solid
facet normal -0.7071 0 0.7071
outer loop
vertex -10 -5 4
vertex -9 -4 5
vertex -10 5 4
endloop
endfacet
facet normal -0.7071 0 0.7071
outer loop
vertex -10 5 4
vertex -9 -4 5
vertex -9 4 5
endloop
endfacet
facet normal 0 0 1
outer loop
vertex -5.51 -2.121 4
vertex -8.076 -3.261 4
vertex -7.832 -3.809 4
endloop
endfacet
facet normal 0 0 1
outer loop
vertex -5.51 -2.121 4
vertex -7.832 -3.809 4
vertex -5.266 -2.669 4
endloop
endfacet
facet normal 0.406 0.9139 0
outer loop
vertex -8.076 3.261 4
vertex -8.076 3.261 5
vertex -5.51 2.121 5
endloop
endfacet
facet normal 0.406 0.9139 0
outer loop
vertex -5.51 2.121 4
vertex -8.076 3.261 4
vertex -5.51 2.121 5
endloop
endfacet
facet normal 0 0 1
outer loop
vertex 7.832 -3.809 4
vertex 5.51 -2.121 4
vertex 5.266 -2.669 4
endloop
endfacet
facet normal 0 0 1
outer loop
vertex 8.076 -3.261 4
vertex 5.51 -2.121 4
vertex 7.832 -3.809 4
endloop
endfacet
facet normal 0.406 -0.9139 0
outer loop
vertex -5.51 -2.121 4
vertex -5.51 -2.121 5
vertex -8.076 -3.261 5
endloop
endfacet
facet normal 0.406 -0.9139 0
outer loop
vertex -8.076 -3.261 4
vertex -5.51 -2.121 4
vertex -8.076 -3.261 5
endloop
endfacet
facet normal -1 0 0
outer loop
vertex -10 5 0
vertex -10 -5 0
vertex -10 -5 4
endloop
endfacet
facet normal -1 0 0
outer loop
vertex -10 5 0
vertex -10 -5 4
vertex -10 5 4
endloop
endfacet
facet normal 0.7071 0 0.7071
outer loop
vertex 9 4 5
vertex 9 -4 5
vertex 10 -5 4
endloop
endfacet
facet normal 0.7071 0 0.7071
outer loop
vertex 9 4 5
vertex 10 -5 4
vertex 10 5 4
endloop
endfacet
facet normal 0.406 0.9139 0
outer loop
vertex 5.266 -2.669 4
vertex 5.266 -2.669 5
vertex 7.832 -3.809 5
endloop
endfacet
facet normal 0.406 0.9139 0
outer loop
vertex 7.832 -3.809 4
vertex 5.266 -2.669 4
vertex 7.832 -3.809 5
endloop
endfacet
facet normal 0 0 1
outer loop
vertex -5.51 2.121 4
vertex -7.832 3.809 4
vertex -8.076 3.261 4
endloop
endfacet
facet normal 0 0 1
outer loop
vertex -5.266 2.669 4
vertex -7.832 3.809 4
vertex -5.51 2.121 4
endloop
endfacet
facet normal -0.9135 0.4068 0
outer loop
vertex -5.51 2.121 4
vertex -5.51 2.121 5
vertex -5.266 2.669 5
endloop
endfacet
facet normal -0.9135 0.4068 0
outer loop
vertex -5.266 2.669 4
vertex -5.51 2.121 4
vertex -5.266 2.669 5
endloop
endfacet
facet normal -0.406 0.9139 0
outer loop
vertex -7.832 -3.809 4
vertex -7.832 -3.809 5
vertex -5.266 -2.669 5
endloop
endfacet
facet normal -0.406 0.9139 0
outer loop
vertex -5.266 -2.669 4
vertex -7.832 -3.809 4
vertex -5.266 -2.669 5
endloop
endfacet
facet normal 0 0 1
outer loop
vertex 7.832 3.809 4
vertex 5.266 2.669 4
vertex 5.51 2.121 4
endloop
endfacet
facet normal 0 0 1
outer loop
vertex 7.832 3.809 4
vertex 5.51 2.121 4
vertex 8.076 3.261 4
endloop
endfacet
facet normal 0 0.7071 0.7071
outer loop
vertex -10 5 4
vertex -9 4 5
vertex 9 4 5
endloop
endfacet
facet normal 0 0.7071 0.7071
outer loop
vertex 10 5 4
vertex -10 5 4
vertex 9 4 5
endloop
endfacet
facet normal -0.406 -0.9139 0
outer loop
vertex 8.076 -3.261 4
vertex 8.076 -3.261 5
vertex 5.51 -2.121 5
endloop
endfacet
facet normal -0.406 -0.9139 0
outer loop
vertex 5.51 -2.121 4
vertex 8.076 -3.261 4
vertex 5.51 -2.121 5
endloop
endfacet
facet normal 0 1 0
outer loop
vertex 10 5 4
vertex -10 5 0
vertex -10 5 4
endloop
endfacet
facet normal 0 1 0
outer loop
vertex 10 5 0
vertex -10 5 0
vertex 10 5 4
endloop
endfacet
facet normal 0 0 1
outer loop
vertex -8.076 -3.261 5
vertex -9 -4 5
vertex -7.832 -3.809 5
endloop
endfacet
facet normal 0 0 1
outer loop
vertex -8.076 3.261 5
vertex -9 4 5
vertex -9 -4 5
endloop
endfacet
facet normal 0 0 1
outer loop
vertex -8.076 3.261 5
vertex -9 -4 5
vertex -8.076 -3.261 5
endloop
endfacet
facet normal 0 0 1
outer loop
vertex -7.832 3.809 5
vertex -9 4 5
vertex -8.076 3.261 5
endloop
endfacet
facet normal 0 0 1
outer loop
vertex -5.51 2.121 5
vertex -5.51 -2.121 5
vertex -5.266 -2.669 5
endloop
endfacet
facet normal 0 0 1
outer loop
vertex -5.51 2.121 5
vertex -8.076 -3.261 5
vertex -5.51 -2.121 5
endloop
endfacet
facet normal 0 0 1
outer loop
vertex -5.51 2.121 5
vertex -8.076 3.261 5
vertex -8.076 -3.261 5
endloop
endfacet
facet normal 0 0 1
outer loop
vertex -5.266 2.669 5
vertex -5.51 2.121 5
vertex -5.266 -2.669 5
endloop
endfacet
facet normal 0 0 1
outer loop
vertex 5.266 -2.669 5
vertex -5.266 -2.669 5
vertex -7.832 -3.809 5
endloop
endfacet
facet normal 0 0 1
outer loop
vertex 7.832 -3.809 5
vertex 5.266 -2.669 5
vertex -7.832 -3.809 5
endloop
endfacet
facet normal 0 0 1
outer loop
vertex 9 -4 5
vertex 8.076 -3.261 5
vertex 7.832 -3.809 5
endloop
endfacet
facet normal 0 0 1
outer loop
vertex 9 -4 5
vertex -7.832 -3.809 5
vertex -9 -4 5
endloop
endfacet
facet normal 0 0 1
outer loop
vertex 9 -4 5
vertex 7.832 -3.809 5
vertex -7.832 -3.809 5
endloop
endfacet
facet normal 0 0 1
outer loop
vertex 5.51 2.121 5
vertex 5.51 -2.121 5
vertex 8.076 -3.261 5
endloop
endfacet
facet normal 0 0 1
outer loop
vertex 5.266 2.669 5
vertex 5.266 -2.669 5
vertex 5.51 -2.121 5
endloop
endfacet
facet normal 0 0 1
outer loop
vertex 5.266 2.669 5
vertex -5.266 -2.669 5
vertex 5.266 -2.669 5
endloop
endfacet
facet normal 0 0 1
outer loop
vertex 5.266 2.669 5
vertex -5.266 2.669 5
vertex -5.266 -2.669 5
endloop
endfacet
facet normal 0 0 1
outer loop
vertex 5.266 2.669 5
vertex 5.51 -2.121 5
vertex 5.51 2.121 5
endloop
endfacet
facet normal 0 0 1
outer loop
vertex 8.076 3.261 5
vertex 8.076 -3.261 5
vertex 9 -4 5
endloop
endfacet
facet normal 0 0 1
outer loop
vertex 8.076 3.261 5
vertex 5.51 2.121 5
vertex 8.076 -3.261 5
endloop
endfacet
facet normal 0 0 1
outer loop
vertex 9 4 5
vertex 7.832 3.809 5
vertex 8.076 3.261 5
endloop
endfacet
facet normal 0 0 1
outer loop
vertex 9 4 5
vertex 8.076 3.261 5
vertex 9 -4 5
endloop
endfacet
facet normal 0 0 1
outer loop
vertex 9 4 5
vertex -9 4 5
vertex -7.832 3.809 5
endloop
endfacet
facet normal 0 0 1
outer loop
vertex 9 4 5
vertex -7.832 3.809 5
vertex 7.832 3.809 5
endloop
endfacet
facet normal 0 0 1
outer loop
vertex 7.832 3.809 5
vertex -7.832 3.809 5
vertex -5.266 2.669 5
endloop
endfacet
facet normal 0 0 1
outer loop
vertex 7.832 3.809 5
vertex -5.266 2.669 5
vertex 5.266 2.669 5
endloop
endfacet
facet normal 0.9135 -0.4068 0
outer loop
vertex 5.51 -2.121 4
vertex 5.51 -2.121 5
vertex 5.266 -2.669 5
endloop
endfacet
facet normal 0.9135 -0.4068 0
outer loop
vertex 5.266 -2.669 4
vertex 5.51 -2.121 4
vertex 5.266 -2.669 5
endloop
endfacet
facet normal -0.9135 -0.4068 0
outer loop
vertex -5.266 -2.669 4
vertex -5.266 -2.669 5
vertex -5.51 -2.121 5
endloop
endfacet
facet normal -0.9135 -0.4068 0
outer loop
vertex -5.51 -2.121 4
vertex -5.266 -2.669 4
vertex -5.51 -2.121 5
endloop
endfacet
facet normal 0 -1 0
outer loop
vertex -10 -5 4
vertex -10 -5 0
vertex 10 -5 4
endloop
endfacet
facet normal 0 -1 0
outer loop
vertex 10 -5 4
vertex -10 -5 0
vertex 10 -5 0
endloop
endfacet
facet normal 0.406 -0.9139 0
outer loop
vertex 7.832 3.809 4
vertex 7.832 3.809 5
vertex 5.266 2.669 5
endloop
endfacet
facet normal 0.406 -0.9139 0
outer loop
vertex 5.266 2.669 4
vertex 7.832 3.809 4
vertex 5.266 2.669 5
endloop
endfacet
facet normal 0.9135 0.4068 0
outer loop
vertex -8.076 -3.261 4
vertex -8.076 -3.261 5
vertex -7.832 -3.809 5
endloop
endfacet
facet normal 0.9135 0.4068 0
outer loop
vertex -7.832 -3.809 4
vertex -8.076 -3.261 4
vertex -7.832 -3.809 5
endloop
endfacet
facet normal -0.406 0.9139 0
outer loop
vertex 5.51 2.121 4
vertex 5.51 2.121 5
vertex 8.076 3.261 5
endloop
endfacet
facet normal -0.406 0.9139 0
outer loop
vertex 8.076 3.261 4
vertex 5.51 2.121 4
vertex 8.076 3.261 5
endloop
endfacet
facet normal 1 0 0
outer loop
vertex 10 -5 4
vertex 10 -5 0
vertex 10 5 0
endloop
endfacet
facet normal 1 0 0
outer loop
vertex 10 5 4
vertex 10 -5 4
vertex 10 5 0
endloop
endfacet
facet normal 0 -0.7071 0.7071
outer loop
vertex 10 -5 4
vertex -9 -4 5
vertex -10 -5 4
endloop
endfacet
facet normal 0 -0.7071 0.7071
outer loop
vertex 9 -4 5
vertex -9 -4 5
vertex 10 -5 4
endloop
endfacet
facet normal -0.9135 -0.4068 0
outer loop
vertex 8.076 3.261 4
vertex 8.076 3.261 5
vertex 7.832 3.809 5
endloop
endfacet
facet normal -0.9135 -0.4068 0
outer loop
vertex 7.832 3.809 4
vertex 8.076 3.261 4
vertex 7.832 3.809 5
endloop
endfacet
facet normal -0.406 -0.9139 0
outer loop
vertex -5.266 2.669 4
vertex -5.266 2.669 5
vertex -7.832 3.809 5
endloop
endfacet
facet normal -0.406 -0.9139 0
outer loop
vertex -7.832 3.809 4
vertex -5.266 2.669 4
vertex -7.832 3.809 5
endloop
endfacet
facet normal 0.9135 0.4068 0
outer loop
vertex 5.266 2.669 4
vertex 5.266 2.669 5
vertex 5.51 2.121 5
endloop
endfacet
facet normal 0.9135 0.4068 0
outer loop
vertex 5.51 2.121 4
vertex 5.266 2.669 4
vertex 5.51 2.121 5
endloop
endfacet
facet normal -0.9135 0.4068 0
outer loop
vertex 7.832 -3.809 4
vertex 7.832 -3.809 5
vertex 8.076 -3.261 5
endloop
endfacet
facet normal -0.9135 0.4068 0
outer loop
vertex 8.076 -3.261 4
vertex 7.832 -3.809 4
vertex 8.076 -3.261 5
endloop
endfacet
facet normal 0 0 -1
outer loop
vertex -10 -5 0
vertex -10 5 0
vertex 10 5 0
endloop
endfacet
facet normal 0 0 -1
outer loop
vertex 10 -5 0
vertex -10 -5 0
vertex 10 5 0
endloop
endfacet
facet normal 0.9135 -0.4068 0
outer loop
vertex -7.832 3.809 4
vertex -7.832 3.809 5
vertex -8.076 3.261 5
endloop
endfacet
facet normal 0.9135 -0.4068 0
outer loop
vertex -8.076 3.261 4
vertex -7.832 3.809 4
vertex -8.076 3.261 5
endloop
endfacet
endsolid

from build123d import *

# Parameters (mm, degrees)
SKETCH_1_W          = 20
SKETCH_1_H          = 10
EXTRUDE_1_DEPTH     = 5
CHAMFER_1_SIZE      = 1
CUT_EXTRUDE_1_DEPTH = 1


with BuildPart() as part:
    # 草图1 → 凸台-拉伸1 (new body)
    with BuildSketch(Plane.XY):
        Rectangle(SKETCH_1_W, SKETCH_1_H)
    extrude(amount=EXTRUDE_1_DEPTH)

    # 倒角1
    chamfer_1_edges = [part.edges().sort_by_distance(p)[0] for p in [
        (-10, 0, 5),
        (0, -5, 5),
        (10, 0, 5),
        (0, 5, 5),
    ]]
    chamfer(chamfer_1_edges, length=CHAMFER_1_SIZE)

    # 草图2 → 切除-拉伸1 (cut)
    with BuildSketch(Plane.XY.offset(5)):
        Polygon((-5.266489436, -2.668957232), (-5.510172516, -2.120670303), (-8.075856157, -3.260974143), (-7.832173078, -3.809261072), align=None)
        Polygon((-5.266489436, 2.668957232), (-7.832173078, 3.809261072), (-8.075856157, 3.260974143), (-5.510172516, 2.120670303), align=None)
        Polygon((5.266489436, 2.668957232), (5.510172516, 2.120670303), (8.075856157, 3.260974143), (7.832173078, 3.809261072), align=None)
        Polygon((5.266489436, -2.668957232), (7.832173078, -3.809261072), (8.075856157, -3.260974143), (5.510172516, -2.120670303), align=None)
    extrude(amount=-CUT_EXTRUDE_1_DEPTH, mode=Mode.SUBTRACT)


solid = part.part
